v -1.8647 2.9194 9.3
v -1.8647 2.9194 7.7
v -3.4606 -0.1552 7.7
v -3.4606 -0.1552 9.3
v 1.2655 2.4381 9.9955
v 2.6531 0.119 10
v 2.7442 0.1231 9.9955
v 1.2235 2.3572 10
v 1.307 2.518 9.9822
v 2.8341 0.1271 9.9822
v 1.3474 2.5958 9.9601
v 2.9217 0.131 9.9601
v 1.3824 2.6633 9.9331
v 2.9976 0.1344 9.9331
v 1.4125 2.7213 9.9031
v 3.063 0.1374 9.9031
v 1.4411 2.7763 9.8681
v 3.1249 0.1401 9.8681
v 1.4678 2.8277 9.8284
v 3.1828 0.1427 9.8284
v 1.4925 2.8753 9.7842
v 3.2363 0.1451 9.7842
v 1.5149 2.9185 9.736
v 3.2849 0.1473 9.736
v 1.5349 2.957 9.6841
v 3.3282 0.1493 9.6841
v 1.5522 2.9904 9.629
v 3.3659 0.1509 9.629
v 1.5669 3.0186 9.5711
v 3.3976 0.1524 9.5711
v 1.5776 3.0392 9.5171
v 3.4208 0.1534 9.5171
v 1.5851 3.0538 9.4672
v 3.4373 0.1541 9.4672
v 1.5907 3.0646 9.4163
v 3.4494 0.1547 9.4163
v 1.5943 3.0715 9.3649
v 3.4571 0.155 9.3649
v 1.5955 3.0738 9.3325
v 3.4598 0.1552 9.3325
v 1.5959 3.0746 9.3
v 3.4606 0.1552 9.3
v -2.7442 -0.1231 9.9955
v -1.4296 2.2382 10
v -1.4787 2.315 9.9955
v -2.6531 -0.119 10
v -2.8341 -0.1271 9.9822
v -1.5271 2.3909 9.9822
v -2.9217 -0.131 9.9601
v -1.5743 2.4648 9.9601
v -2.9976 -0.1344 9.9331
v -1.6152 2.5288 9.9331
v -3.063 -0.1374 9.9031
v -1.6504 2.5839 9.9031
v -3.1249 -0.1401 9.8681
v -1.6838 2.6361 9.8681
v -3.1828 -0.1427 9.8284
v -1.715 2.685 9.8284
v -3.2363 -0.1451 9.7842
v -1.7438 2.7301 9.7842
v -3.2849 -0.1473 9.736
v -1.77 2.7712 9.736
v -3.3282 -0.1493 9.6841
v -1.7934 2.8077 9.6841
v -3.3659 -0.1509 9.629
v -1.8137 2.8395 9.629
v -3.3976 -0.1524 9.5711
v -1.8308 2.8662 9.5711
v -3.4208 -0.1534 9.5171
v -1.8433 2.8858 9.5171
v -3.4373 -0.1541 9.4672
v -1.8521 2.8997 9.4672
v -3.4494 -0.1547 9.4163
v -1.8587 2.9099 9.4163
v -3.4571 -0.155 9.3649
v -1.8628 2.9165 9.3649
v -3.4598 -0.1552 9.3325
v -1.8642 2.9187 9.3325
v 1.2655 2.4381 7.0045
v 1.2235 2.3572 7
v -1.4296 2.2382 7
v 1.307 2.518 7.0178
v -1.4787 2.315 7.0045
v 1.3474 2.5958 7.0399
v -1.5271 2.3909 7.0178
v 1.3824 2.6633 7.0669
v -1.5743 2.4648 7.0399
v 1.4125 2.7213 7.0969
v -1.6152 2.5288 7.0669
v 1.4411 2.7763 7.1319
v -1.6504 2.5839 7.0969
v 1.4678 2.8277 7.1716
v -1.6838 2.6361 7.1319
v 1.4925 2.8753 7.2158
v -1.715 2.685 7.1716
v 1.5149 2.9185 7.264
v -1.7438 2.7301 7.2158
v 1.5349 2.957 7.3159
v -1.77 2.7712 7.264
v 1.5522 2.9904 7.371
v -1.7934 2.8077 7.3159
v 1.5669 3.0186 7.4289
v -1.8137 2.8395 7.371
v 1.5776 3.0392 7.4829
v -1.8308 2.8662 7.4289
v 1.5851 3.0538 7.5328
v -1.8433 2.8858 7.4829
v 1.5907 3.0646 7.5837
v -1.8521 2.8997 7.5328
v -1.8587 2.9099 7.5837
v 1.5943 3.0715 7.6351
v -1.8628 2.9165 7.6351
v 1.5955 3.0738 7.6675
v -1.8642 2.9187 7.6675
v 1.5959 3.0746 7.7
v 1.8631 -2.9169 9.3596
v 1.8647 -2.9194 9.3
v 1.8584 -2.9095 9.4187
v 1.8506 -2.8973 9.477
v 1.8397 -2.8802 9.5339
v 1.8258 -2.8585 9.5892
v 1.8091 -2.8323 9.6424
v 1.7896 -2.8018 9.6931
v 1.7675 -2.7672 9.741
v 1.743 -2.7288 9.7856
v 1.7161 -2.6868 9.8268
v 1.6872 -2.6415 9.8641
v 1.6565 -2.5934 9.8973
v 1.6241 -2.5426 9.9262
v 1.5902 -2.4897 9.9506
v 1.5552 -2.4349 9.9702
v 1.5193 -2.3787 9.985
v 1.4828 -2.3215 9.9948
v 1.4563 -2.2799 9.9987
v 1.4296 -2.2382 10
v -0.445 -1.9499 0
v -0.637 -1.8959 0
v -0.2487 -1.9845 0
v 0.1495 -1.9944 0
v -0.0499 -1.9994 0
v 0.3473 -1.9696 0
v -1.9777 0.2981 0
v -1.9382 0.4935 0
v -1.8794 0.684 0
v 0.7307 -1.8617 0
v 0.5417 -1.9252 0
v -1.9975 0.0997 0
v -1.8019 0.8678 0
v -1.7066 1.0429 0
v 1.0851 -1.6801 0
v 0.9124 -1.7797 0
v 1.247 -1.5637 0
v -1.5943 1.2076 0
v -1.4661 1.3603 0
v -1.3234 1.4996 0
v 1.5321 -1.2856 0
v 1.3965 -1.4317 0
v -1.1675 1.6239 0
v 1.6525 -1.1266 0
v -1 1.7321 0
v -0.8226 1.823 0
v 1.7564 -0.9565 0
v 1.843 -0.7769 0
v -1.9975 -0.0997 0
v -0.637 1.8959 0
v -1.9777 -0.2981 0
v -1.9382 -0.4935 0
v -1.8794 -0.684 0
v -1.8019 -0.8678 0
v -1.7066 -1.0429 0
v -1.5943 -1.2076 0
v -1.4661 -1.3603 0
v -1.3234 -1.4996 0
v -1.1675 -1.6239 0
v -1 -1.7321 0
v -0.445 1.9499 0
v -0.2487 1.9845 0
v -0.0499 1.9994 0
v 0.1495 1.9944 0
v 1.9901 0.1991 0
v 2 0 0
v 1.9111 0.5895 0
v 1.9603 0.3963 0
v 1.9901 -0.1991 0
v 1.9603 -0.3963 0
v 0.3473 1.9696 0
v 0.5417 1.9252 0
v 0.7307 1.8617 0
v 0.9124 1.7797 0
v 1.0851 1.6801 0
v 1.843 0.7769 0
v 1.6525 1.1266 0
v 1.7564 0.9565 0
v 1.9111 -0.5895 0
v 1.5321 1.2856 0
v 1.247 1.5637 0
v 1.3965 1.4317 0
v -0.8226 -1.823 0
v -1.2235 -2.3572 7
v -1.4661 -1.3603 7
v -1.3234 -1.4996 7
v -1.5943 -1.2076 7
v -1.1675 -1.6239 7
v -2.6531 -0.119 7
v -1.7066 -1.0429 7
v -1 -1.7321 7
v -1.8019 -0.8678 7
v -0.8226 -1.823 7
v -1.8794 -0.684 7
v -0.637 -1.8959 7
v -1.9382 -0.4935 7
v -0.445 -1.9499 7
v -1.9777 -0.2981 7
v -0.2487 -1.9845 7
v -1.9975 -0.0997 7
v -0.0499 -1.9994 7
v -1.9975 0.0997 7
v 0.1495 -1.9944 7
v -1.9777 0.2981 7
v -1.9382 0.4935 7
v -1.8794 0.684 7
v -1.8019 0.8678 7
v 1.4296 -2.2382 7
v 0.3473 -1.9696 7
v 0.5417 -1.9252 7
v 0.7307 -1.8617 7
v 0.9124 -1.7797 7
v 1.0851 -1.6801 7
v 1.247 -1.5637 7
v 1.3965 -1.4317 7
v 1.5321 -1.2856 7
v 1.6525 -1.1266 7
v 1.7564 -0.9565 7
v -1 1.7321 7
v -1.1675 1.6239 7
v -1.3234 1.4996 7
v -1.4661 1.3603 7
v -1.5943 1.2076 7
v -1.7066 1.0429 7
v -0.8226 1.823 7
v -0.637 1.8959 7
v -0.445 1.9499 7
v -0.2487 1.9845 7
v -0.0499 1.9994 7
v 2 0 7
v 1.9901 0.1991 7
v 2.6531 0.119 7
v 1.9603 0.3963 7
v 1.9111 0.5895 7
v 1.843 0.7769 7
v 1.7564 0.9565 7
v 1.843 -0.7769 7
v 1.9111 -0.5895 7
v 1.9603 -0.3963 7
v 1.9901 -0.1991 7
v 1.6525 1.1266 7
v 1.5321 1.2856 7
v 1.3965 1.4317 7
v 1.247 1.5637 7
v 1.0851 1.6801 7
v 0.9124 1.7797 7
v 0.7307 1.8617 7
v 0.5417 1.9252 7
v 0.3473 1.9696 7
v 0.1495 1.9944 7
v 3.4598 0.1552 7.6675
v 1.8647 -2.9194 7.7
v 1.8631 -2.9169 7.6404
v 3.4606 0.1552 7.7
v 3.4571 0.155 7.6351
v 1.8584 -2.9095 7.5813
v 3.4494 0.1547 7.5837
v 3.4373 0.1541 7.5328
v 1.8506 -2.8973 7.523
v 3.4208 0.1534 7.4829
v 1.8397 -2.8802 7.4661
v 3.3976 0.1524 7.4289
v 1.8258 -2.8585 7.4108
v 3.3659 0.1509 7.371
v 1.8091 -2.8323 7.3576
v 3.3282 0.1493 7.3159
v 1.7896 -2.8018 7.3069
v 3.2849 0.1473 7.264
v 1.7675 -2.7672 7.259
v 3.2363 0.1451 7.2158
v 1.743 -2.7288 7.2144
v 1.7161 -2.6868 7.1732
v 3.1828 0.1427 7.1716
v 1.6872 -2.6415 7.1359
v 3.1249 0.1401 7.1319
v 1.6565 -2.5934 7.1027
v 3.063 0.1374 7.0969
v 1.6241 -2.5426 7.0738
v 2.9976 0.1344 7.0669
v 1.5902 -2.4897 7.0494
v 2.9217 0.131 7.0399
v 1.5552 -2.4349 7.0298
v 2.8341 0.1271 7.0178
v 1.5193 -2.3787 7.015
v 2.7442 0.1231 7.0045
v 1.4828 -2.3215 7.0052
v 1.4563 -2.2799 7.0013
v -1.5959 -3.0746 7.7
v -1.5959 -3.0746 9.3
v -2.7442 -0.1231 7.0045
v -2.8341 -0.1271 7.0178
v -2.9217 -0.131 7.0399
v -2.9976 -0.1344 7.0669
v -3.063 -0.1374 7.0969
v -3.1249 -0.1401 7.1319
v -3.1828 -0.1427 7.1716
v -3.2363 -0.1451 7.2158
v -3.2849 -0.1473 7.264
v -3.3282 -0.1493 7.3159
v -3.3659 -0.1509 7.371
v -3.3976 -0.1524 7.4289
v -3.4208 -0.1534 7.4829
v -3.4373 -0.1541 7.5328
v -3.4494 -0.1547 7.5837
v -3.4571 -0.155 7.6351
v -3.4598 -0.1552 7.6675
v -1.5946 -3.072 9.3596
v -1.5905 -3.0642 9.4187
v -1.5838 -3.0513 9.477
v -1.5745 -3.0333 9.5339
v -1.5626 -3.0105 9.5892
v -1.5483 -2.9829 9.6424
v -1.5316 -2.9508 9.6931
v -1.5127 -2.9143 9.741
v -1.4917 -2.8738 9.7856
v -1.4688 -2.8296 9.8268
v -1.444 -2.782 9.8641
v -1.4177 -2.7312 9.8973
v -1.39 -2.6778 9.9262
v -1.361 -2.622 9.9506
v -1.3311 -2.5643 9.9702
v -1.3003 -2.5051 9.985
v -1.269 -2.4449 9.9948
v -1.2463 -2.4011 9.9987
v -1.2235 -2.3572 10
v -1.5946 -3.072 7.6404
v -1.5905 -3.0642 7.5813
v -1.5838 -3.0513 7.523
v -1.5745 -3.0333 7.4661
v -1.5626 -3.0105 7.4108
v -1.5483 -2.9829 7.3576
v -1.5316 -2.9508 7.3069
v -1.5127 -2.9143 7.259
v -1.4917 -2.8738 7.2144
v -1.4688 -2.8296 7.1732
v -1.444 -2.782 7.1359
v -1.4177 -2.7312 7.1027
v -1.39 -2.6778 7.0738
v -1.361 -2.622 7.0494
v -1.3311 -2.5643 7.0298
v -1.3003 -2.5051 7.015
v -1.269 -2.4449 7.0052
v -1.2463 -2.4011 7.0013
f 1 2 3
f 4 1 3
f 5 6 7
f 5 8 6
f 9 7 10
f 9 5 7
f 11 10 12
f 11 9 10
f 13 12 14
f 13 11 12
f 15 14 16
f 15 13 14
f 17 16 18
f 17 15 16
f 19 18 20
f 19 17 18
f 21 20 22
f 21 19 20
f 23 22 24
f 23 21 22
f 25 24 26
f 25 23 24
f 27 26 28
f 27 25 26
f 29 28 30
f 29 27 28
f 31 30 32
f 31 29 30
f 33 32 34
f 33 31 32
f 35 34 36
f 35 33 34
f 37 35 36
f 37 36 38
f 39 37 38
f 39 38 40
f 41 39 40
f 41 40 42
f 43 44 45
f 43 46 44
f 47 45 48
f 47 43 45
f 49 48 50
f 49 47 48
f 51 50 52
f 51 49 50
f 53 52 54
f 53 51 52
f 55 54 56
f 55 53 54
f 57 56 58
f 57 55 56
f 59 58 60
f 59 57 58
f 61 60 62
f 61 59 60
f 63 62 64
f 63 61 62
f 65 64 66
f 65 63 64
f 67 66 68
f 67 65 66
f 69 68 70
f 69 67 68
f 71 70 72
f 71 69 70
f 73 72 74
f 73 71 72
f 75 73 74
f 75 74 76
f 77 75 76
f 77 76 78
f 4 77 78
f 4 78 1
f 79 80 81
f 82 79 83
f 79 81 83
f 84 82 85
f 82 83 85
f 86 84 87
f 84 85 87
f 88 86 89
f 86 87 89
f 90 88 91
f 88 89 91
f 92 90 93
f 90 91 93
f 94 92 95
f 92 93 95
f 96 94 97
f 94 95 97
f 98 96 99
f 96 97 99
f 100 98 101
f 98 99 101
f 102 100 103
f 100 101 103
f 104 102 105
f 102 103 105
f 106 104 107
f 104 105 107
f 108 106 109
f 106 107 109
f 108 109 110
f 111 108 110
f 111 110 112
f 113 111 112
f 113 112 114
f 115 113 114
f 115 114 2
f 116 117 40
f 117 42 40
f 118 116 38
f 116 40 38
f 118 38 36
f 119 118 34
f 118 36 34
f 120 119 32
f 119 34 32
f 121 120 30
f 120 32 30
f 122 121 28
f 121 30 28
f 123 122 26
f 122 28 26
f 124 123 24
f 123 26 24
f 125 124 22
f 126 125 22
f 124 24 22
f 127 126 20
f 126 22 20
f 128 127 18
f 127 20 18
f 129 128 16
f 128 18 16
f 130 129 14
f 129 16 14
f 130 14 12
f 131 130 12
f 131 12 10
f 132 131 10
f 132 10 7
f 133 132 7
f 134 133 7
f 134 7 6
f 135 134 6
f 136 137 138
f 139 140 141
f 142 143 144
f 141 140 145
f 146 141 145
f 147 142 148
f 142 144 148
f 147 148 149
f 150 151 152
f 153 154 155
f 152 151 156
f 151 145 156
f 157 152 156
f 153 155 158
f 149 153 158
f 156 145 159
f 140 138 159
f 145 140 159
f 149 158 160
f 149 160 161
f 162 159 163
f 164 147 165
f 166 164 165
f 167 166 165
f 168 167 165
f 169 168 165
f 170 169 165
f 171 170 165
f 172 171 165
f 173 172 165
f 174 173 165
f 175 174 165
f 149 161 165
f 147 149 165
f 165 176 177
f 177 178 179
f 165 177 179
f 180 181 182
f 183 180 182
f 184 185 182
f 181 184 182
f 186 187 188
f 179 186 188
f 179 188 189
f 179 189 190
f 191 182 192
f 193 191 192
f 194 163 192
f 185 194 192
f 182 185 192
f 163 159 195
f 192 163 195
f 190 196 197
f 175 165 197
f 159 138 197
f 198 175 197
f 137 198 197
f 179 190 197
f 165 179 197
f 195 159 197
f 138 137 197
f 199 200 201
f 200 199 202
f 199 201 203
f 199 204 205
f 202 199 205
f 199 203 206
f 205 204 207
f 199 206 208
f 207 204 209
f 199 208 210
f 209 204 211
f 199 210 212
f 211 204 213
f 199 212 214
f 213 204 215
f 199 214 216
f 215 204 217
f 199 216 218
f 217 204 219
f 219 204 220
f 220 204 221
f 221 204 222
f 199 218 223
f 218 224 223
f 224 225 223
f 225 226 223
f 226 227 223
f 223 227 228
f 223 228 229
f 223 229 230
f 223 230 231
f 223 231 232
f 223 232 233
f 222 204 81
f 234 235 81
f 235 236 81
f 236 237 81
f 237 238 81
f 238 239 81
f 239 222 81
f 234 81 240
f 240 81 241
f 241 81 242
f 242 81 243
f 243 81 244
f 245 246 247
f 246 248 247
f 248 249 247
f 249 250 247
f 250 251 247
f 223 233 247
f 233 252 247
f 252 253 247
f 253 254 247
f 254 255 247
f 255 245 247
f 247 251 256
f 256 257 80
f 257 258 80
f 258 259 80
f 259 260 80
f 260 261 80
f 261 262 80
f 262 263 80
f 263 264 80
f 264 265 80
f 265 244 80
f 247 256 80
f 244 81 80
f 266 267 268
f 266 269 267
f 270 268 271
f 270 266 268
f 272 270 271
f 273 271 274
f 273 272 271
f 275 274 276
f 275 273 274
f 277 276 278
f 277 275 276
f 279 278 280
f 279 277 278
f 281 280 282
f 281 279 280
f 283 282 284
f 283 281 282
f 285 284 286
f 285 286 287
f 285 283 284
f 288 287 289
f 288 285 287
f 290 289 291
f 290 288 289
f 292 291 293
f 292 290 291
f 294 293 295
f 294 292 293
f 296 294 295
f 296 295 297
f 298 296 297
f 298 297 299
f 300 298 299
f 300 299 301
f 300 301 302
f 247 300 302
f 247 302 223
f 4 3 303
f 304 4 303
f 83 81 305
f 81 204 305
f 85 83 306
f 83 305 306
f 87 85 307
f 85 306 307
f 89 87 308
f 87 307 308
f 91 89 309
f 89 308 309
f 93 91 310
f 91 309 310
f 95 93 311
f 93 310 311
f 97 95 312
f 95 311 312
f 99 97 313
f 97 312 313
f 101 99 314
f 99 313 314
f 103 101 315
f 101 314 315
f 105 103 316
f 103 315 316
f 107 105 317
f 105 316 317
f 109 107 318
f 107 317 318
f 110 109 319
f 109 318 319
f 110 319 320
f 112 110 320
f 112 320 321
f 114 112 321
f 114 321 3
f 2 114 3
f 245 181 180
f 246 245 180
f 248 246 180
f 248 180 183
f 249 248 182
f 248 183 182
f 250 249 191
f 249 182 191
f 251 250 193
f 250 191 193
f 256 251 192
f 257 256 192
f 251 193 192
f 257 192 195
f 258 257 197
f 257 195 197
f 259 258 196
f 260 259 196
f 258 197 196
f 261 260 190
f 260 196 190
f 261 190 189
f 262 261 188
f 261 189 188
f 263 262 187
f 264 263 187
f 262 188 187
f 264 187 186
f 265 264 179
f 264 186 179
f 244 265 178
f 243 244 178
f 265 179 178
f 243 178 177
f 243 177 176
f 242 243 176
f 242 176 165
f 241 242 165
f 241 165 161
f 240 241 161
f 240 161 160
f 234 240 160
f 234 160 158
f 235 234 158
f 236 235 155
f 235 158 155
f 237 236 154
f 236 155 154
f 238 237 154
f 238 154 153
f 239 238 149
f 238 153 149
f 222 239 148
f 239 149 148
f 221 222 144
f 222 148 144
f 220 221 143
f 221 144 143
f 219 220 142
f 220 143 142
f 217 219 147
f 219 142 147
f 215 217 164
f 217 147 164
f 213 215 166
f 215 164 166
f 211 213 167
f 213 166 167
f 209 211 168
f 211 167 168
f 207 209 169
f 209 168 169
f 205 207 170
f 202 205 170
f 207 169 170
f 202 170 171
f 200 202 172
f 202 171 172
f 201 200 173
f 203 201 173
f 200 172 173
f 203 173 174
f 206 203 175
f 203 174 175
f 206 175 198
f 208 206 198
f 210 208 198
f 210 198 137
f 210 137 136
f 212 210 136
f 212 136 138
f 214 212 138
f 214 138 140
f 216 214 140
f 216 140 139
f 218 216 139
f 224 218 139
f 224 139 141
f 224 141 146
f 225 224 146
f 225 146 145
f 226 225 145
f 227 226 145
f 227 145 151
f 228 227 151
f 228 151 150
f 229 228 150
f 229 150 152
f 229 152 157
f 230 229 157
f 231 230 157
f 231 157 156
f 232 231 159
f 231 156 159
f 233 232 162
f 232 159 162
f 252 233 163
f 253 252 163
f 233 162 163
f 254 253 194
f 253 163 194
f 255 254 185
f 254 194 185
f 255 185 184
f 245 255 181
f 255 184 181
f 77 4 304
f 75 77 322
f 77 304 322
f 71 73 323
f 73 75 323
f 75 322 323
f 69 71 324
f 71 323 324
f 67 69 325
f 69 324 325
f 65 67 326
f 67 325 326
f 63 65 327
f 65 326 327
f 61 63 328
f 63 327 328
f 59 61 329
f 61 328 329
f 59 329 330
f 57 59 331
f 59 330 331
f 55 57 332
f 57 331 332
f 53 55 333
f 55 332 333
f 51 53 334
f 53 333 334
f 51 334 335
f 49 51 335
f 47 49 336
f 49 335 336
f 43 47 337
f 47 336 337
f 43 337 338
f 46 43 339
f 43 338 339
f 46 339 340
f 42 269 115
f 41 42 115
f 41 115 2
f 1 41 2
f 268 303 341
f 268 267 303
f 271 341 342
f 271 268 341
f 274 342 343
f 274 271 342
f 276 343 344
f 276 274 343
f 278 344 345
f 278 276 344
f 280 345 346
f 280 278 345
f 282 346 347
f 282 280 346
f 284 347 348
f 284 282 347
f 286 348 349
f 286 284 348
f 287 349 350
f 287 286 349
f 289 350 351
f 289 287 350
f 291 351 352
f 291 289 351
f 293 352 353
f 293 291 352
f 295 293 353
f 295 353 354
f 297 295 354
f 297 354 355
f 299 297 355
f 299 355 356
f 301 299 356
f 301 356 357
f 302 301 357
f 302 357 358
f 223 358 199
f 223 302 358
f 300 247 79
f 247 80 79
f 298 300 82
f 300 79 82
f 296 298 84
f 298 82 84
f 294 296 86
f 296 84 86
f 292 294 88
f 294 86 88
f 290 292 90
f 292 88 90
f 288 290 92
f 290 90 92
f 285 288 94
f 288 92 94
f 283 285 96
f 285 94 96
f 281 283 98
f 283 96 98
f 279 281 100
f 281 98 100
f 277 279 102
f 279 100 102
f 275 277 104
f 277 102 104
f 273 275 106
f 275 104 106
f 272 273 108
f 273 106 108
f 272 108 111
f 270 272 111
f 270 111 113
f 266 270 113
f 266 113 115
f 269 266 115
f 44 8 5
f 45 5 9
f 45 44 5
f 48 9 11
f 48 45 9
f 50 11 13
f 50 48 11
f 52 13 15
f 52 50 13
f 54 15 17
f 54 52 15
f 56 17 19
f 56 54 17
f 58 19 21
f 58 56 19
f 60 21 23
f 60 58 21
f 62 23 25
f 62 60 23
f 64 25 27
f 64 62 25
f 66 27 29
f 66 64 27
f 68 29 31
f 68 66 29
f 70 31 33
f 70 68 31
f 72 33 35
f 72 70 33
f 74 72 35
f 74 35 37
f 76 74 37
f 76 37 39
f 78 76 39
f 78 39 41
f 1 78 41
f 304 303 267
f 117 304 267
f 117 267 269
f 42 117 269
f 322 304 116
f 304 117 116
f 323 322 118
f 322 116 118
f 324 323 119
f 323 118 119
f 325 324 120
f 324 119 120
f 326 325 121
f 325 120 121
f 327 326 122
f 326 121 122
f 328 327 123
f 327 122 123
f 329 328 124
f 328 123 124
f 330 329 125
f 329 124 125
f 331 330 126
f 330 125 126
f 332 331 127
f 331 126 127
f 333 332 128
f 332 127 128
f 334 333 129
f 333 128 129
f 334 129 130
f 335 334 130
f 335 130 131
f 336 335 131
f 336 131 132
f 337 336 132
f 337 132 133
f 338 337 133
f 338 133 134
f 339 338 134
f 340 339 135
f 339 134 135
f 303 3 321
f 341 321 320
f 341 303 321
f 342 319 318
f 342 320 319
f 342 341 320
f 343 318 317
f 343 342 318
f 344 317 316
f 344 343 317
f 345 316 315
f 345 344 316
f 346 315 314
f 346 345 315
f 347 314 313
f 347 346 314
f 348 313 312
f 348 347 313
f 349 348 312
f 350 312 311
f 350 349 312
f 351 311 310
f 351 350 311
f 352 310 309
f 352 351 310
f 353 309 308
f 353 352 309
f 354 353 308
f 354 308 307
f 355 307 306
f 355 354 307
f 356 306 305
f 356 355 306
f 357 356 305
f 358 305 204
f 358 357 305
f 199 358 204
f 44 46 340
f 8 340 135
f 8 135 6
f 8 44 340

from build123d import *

# Parameters (mm, degrees)
SKETCH1_R           = 2
BOSS_EXTRUDE1_DEPTH = 7
BOSS_EXTRUDE2_DEPTH = 3
FILLET1_R           = 0.7


with BuildPart() as part:
    # Sketch1 → Boss-Extrude1 (new body)
    with BuildSketch(Plane.XY):
        Circle(SKETCH1_R)
    extrude(amount=BOSS_EXTRUDE1_DEPTH)

    # Sketch2 → Boss-Extrude2 (add)
    with BuildSketch(Plane.XY.offset(7)):
        Polygon((-1.595912417, -3.074583477), (1.864711189, -2.919392434), (3.460623606, 0.155191044), (1.595912417, 3.074583477), (-1.864711189, 2.919392434), (-3.460623606, -0.155191044), align=None)
    extrude(amount=BOSS_EXTRUDE2_DEPTH)

    # Fillet1
    fillet1_edges = [part.edges().sort_by_distance(p)[0] for p in [
        (2.528268011, 1.614887261, 7),
        (-0.134399386, 2.996987955, 7),
        (-2.662667397, 1.382100695, 7),
        (-2.528268011, -1.614887261, 7),
        (0.134399386, -2.996987955, 7),
        (2.662667397, -1.382100695, 7),
        (2.528268011, 1.614887261, 10),
        (-0.134399386, 2.996987955, 10),
        (-2.662667397, 1.382100695, 10),
        (-2.528268011, -1.614887261, 10),
        (0.134399386, -2.996987955, 10),
        (2.662667397, -1.382100695, 10),
    ]]
    fillet(fillet1_edges, radius=FILLET1_R)


solid = part.part
